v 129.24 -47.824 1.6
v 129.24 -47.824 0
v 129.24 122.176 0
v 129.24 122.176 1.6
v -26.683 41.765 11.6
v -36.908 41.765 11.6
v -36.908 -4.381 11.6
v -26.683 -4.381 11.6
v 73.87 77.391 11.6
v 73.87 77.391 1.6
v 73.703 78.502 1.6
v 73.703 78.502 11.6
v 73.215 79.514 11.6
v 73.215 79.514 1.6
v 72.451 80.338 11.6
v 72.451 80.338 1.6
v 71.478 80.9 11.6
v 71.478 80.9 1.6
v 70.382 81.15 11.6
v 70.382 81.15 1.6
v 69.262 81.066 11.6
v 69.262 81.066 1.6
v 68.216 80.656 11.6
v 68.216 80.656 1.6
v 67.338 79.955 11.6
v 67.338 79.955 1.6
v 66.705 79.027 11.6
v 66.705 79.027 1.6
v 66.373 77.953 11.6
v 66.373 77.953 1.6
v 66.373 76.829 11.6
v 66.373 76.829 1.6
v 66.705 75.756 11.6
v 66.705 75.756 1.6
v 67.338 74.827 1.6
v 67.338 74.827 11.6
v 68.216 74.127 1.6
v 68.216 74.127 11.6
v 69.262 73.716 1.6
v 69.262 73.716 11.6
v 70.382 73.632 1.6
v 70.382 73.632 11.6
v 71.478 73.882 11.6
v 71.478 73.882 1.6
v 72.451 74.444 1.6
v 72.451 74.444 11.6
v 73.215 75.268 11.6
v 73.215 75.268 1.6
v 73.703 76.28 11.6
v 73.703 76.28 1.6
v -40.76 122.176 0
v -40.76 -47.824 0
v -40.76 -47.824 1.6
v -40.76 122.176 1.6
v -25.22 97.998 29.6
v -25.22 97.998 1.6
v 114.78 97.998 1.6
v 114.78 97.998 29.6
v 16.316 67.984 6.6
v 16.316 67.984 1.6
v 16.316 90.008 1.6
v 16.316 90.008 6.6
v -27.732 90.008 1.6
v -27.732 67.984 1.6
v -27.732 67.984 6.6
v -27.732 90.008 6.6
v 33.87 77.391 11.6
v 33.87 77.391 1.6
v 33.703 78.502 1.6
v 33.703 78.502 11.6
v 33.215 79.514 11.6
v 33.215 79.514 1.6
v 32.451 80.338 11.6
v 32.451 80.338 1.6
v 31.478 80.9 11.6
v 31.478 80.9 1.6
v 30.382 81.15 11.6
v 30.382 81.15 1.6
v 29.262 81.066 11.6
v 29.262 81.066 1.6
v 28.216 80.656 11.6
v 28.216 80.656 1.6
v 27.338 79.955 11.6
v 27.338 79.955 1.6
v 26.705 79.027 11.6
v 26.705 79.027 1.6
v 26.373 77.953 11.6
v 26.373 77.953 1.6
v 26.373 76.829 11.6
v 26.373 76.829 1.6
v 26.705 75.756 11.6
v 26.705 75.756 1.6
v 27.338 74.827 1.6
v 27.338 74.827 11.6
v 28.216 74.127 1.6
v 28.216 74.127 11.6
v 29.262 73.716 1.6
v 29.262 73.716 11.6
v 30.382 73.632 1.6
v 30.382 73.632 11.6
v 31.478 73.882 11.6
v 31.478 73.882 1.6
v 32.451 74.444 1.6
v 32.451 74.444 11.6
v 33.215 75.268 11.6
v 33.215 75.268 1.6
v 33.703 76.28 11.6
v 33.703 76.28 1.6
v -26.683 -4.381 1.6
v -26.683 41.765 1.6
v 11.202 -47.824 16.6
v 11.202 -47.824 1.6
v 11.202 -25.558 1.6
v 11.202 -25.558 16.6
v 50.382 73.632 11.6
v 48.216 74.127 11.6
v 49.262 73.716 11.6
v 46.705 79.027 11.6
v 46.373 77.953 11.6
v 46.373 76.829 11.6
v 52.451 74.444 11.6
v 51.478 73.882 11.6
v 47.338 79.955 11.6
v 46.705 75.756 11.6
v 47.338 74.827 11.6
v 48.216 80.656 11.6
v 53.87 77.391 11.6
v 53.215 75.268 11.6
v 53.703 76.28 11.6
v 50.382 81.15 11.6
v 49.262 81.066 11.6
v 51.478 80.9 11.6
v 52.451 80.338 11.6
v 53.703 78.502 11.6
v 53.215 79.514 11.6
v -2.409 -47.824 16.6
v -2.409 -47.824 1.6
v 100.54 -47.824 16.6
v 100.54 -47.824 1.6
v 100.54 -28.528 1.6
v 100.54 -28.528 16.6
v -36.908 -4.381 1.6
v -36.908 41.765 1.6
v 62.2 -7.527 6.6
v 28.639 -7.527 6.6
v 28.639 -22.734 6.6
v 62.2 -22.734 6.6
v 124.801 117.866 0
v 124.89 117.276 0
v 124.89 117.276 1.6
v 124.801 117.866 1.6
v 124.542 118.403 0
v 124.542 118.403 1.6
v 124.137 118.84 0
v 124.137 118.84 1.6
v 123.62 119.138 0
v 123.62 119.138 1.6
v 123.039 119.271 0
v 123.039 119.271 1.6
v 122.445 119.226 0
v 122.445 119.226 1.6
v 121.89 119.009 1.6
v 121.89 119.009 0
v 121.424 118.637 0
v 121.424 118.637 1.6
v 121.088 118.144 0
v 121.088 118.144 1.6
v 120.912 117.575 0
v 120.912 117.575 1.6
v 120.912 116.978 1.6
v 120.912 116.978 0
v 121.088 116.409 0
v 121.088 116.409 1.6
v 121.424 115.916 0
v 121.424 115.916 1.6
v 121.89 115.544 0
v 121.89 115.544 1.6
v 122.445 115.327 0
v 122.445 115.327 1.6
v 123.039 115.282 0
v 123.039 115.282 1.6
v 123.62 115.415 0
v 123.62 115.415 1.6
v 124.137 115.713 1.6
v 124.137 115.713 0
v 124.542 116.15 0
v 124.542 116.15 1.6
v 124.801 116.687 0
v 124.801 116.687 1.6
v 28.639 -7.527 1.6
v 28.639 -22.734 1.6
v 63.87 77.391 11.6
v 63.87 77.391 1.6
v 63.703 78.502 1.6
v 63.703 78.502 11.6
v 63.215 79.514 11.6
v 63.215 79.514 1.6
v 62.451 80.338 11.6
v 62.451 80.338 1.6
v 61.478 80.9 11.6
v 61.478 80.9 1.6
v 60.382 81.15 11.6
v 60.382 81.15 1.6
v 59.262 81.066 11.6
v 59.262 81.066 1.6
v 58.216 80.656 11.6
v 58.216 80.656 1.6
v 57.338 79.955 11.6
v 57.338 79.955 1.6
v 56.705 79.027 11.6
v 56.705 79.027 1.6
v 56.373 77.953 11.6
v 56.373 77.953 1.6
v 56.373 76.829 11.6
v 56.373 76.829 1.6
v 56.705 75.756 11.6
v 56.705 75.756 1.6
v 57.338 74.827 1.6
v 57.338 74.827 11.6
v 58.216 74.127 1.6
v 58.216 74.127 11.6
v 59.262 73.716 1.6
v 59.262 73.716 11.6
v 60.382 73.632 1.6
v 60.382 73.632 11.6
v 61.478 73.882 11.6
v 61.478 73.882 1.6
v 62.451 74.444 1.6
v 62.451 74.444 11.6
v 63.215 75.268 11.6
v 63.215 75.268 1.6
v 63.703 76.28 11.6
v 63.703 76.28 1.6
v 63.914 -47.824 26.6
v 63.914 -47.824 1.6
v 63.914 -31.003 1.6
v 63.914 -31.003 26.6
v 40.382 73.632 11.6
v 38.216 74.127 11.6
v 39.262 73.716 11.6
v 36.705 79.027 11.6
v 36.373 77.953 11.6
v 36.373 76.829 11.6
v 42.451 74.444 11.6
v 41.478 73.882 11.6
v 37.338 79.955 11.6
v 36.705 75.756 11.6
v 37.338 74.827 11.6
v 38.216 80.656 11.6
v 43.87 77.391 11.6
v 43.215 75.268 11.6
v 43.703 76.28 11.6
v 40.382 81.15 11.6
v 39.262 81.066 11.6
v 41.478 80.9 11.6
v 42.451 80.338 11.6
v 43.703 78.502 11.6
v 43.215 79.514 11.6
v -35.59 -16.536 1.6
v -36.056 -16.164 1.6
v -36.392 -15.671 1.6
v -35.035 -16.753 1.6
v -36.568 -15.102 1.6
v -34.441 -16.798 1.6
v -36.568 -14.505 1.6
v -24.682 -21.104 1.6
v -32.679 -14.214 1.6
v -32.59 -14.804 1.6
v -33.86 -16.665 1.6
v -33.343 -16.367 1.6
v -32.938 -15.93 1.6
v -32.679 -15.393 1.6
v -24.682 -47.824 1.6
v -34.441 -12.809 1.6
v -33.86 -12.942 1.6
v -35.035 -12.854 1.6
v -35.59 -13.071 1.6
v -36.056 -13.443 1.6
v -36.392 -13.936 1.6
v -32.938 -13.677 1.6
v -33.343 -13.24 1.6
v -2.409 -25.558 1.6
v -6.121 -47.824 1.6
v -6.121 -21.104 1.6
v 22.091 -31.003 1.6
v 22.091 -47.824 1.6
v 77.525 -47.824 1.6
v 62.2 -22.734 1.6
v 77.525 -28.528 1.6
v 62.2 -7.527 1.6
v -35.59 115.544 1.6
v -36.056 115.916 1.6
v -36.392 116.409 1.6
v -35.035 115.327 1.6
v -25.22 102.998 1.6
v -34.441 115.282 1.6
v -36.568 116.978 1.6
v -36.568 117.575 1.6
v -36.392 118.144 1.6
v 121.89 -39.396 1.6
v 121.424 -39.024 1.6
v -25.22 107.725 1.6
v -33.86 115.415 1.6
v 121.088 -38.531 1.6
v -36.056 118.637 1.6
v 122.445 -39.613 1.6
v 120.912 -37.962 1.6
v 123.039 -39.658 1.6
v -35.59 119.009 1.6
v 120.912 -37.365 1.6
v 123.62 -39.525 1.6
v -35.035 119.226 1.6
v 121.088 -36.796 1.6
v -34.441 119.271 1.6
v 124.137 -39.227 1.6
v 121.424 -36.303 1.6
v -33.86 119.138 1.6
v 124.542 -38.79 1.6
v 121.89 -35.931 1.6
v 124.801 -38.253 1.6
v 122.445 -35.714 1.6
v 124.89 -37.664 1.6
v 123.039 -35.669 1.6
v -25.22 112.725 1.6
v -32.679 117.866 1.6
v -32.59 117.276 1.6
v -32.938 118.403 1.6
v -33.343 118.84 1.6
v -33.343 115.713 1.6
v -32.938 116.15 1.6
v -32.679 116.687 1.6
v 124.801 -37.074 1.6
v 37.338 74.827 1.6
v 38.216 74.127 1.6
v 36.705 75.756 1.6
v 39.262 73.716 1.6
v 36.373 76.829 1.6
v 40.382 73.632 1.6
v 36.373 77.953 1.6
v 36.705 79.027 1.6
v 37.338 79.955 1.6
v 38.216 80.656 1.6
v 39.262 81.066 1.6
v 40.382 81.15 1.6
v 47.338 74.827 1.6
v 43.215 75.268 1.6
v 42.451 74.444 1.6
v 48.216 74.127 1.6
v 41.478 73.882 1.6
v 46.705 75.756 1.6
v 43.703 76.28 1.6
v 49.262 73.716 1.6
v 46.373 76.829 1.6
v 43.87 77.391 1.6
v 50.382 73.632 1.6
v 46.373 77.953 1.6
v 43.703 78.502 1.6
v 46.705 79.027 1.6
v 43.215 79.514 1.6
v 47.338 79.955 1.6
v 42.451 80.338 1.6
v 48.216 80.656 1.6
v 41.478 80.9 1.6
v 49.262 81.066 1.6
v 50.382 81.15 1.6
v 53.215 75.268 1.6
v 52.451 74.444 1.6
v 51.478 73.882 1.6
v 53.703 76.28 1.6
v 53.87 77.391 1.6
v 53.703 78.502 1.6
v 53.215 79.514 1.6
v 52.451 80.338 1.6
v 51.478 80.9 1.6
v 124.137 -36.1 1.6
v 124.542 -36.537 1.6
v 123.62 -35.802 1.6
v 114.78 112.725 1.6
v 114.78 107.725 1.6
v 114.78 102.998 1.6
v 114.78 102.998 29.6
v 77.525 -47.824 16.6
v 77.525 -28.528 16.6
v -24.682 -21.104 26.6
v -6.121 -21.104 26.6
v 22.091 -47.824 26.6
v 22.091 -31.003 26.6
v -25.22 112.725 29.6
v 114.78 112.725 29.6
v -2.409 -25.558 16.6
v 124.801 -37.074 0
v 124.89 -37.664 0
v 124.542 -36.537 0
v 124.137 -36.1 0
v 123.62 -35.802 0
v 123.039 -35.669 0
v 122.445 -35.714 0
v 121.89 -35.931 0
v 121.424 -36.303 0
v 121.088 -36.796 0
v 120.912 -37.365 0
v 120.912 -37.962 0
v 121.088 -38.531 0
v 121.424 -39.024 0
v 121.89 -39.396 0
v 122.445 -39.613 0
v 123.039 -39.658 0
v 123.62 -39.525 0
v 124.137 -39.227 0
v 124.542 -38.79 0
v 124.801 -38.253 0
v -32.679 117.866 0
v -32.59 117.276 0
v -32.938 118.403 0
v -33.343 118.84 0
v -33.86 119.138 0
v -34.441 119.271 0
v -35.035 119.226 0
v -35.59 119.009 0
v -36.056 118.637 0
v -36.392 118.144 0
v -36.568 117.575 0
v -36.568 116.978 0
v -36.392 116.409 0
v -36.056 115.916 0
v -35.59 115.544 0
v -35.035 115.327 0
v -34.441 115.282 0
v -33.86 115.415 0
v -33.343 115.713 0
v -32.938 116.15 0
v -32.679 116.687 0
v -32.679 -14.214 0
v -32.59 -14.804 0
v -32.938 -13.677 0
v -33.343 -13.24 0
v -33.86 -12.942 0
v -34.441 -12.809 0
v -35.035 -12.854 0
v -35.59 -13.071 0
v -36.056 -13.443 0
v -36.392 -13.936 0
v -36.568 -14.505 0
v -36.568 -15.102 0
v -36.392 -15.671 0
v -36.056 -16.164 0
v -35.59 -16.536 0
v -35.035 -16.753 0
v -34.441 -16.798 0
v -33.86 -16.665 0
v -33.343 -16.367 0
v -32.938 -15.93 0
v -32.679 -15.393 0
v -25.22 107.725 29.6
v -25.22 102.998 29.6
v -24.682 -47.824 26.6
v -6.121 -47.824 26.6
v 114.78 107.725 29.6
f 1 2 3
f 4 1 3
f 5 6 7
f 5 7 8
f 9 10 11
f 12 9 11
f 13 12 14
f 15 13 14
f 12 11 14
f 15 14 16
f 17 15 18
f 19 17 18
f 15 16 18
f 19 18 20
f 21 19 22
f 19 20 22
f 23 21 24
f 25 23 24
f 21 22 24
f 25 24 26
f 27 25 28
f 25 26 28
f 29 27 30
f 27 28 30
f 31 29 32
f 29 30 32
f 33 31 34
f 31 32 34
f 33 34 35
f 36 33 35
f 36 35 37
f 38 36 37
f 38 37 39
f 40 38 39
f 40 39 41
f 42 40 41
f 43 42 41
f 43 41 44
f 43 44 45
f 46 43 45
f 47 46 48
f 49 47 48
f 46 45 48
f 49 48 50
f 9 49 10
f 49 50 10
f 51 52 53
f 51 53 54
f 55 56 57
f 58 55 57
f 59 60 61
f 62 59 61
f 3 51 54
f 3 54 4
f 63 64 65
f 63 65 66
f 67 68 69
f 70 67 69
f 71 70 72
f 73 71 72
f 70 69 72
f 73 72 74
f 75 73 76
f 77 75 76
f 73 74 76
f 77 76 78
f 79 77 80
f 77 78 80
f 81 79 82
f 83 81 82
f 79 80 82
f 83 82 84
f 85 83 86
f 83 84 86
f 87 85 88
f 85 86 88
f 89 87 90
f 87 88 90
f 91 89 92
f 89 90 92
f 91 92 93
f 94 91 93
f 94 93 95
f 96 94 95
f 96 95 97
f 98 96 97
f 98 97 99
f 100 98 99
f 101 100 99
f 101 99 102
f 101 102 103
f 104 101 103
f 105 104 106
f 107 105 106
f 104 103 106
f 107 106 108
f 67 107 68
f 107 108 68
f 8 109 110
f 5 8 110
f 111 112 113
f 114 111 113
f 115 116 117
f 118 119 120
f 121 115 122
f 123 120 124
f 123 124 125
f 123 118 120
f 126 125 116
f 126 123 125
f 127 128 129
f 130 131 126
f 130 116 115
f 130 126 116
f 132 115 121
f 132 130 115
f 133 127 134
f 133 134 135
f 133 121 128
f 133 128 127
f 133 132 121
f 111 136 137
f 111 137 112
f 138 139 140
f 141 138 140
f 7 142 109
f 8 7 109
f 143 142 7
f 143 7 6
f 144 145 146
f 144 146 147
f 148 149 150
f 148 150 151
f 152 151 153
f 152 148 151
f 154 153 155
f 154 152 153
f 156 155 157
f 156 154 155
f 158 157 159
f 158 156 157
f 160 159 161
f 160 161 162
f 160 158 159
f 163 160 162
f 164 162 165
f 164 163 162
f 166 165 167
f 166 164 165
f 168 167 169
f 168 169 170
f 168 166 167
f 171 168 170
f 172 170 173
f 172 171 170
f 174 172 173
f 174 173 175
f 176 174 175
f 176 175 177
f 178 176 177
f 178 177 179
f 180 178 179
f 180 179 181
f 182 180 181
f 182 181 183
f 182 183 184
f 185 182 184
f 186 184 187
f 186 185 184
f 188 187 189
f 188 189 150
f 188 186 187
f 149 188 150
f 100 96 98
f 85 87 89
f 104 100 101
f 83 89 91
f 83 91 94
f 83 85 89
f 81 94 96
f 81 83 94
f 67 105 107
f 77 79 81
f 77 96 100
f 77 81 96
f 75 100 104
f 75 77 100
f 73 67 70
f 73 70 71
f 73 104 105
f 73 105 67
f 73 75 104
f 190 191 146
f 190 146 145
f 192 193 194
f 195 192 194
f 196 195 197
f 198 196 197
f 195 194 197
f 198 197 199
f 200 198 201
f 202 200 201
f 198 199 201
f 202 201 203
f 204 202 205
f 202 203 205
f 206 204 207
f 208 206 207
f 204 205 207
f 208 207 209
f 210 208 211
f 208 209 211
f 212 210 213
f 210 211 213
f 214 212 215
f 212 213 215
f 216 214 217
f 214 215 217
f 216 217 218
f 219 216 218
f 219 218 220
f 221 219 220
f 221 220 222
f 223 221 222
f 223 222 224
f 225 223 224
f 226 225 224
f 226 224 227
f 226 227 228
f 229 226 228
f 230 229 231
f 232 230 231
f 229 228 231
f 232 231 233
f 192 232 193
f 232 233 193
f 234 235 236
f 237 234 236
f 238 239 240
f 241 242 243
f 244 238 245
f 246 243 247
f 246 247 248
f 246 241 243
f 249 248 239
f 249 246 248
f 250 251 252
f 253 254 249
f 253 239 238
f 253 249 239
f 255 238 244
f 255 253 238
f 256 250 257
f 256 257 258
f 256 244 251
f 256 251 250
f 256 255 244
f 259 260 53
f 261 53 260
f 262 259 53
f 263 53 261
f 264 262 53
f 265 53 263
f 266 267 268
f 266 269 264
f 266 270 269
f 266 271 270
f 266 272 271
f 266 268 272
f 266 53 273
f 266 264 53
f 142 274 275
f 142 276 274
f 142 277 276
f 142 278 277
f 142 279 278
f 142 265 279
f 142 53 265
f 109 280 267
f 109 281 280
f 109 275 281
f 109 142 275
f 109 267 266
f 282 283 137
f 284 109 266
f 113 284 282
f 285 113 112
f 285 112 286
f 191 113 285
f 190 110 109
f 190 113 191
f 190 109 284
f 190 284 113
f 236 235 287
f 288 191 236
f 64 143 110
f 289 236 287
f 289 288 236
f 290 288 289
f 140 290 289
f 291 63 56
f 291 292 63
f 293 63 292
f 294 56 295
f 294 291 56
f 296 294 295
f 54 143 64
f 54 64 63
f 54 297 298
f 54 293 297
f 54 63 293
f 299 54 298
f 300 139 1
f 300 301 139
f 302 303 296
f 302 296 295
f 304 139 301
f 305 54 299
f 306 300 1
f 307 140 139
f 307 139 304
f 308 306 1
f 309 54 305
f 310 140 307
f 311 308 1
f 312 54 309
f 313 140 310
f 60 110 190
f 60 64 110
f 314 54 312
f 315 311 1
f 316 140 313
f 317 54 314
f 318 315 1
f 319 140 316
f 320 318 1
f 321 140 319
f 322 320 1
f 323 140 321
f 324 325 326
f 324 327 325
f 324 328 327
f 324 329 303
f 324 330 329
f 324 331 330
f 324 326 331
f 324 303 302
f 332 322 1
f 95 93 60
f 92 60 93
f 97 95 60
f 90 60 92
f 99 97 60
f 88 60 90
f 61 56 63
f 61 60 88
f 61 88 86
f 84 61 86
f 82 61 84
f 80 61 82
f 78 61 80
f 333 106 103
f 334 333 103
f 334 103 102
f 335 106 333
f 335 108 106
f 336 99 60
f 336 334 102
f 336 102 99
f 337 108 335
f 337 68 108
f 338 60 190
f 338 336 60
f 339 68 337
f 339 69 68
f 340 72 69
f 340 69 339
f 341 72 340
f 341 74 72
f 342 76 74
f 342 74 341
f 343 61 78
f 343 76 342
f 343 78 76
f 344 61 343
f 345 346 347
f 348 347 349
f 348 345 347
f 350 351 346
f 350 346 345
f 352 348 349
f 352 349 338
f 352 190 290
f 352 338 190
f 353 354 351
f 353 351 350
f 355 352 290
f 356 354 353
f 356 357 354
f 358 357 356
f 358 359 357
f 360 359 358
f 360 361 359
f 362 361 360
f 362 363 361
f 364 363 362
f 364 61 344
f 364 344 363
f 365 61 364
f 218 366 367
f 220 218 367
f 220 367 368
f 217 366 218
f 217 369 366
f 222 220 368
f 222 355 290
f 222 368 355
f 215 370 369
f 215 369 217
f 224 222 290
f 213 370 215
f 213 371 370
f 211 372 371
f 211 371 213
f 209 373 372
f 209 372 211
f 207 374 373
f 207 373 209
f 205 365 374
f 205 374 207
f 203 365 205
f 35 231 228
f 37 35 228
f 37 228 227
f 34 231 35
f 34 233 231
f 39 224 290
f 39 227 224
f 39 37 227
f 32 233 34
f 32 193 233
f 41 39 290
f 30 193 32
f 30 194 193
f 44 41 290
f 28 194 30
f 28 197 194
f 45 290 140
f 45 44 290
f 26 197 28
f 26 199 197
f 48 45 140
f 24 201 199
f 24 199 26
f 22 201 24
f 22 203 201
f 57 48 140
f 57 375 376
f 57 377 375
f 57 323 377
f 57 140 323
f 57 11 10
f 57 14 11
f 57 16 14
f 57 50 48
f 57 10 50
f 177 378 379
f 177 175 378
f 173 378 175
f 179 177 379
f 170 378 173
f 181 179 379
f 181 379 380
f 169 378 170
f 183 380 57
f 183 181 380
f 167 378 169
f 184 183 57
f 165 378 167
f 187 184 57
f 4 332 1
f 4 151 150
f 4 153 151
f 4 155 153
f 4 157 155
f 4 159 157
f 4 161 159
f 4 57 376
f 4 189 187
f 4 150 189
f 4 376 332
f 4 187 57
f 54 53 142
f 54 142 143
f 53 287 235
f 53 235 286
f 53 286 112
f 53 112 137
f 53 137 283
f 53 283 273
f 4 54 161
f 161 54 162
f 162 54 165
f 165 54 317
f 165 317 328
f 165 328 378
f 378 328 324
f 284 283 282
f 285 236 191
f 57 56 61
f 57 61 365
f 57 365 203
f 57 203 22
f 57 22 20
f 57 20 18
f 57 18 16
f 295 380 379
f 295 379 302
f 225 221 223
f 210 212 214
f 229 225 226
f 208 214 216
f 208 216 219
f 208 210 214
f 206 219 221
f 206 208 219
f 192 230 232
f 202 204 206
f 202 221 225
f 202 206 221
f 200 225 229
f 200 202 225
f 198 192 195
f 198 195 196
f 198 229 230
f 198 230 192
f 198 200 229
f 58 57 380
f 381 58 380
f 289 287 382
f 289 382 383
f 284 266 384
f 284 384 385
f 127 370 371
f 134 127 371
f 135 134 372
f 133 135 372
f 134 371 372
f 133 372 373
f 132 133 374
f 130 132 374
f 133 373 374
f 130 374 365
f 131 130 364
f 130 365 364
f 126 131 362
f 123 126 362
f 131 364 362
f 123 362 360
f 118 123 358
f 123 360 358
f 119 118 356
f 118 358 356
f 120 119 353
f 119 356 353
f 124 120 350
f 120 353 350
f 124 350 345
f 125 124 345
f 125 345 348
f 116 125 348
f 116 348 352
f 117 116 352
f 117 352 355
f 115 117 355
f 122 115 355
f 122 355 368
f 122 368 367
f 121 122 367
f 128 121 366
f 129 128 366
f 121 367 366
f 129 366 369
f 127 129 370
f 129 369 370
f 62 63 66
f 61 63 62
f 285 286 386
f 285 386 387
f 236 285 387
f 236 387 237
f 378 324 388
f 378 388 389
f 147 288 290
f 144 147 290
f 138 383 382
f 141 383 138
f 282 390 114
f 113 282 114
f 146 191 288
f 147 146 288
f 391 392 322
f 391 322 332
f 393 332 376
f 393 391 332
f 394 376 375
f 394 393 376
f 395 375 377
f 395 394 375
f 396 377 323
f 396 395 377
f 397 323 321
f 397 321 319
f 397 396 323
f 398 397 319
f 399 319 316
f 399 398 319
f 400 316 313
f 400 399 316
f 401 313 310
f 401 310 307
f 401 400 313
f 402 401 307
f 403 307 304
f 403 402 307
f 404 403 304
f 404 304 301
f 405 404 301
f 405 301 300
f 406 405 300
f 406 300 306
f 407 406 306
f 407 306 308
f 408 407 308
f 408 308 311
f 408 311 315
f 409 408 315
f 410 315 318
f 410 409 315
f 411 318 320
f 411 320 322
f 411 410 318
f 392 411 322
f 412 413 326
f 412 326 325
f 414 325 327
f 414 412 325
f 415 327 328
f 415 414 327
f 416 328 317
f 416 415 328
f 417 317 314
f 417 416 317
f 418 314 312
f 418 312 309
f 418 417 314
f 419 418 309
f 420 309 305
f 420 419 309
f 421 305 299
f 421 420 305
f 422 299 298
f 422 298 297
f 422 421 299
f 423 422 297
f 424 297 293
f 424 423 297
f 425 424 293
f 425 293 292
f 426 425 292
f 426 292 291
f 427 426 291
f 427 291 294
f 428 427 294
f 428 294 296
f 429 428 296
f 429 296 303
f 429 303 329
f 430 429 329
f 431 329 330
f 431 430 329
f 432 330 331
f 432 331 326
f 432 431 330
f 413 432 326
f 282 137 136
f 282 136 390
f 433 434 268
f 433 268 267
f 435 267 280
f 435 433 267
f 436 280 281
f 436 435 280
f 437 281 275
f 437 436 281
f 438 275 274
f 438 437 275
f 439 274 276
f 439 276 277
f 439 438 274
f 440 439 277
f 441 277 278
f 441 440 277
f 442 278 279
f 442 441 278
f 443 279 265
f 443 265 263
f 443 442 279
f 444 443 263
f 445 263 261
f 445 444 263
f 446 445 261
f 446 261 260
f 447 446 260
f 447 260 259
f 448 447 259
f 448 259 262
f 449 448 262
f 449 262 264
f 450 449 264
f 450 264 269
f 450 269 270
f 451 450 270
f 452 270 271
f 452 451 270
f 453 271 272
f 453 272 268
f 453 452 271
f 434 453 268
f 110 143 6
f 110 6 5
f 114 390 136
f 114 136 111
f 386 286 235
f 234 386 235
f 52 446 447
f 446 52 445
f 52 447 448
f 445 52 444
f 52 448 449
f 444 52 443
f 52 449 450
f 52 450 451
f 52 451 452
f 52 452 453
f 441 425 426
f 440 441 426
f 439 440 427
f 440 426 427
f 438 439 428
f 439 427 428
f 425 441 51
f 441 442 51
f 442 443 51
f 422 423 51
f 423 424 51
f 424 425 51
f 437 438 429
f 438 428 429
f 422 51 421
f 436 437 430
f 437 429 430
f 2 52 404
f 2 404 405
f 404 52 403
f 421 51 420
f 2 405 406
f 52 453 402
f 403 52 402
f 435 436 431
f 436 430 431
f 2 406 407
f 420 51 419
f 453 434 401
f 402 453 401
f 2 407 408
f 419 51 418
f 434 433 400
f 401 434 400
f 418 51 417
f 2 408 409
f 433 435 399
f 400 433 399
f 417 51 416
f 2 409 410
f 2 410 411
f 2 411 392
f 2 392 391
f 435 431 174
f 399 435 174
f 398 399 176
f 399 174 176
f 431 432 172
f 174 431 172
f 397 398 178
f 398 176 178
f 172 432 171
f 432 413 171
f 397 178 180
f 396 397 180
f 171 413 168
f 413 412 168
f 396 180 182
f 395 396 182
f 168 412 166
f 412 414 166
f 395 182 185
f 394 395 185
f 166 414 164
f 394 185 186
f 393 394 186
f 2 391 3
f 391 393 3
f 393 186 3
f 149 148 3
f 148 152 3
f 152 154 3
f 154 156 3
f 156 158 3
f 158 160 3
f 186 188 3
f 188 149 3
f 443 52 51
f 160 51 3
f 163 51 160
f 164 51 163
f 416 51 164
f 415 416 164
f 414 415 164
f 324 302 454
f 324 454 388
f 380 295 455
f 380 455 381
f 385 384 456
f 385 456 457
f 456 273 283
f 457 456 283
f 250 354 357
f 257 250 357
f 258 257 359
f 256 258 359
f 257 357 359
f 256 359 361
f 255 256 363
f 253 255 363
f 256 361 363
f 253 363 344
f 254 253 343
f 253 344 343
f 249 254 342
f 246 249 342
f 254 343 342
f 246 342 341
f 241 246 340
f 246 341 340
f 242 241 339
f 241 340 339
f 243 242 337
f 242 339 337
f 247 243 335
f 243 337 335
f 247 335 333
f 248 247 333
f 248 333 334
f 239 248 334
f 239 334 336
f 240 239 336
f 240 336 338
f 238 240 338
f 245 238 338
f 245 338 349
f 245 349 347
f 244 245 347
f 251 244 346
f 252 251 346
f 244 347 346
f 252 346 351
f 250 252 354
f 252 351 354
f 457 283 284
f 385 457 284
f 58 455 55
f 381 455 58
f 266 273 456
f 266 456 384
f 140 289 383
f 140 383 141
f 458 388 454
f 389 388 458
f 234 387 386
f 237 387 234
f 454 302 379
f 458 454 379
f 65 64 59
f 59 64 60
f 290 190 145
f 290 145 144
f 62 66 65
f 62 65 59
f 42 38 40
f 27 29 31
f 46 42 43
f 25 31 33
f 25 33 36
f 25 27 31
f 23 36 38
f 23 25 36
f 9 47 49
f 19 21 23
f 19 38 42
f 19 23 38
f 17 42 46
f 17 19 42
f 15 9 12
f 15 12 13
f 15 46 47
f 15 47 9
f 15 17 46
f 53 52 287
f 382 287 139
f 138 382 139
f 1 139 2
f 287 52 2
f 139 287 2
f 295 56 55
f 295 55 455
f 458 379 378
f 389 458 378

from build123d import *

# Parameters (mm, degrees)
F0_W     = 170
F0_H     = 170
F0_R     = 2
F1_DEPTH = 1.6
F2_W     = 140
F2_H     = 5
F3_DEPTH = 28
F2_W_2   = 18.561
F2_H_2   = 26.719725
F2_W_3   = 41.82321
F2_H_3   = 16.820741
F4_DEPTH = 25
F2_W_4   = 13.611103
F2_H_4   = 22.265183
F2_W_5   = 23.015141
F2_H_5   = 19.295486
F5_DEPTH = 15
F2_R     = 3.769423
F6_DEPTH = 10
F2_W_6   = 33.560348
F2_H_6   = 15.207031
F2_W_7   = 44.047956
F2_H_7   = 22.023975
F7_DEPTH = 5
F2_W_8   = 10.225419
F2_H_8   = 46.145479
F8_DEPTH = 10


with BuildPart() as f1:
    # F0 (on Top) → F1 (new body)
    with BuildSketch(Plane.XY):
        with Locations((44.239621, 37.176466)):
            Rectangle(F0_W, F0_H)
        with Locations((-34.590379, -14.803534)):
            Circle(F0_R, mode=Mode.SUBTRACT)
        with Locations((122.889621, -37.663534)):
            Circle(F0_R, mode=Mode.SUBTRACT)
        with Locations((-34.590379, 117.276466)):
            Circle(F0_R, mode=Mode.SUBTRACT)
        with Locations((122.889621, 117.276466)):
            Circle(F0_R, mode=Mode.SUBTRACT)
    extrude(amount=F1_DEPTH)

    # F2 (on face) → F3 (join)
    with BuildSketch(Plane.XY.offset(1.6)):
        with Locations((44.780245, 100.497786)):
            Rectangle(F2_W, F2_H)
        with Locations((44.780245, 110.224786)):
            Rectangle(F2_W, F2_H)
    extrude(amount=F3_DEPTH)

    # F2 (on face) → F4 (join)
    with BuildSketch(Plane.XY.offset(1.6)):
        with Locations((-15.401558, -34.463671)):
            Rectangle(F2_W_2, F2_H_2)
        with Locations((43.002247, -39.413163)):
            Rectangle(F2_W_3, F2_H_3)
    extrude(amount=F4_DEPTH)

    # F2 (on face) → F5 (join)
    with BuildSketch(Plane.XY.offset(1.6)):
        with Locations((4.396209, -36.690942)):
            Rectangle(F2_W_4, F2_H_4)
        with Locations((89.032523, -38.175791)):
            Rectangle(F2_W_5, F2_H_5)
    extrude(amount=F5_DEPTH)

    # F2 (on face) → F6 (join)
    with BuildSketch(Plane.XY.offset(1.6)):
        with Locations((30.100717, 77.391095)):
            Circle(F2_R)
        with Locations((40.100717, 77.391095)):
            Circle(F2_R)
        with Locations((50.100717, 77.391095)):
            Circle(F2_R)
        with Locations((60.100717, 77.391095)):
            Circle(F2_R)
        with Locations((70.100717, 77.391095)):
            Circle(F2_R)
    extrude(amount=F6_DEPTH)

    # F2 (on face) → F7 (join)
    with BuildSketch(Plane.XY.offset(1.6)):
        with Locations((45.419478, -15.130484)):
            Rectangle(F2_W_6, F2_H_6)
        with Locations((-5.707614, 78.995801)):
            Rectangle(F2_W_7, F2_H_7)
    extrude(amount=F7_DEPTH)

    # F2 (on face) → F8 (join)
    with BuildSketch(Plane.XY.offset(1.6)):
        with Locations((-31.79554, 18.692056)):
            Rectangle(F2_W_8, F2_H_8)
    extrude(amount=F8_DEPTH)


solid = f1.part
